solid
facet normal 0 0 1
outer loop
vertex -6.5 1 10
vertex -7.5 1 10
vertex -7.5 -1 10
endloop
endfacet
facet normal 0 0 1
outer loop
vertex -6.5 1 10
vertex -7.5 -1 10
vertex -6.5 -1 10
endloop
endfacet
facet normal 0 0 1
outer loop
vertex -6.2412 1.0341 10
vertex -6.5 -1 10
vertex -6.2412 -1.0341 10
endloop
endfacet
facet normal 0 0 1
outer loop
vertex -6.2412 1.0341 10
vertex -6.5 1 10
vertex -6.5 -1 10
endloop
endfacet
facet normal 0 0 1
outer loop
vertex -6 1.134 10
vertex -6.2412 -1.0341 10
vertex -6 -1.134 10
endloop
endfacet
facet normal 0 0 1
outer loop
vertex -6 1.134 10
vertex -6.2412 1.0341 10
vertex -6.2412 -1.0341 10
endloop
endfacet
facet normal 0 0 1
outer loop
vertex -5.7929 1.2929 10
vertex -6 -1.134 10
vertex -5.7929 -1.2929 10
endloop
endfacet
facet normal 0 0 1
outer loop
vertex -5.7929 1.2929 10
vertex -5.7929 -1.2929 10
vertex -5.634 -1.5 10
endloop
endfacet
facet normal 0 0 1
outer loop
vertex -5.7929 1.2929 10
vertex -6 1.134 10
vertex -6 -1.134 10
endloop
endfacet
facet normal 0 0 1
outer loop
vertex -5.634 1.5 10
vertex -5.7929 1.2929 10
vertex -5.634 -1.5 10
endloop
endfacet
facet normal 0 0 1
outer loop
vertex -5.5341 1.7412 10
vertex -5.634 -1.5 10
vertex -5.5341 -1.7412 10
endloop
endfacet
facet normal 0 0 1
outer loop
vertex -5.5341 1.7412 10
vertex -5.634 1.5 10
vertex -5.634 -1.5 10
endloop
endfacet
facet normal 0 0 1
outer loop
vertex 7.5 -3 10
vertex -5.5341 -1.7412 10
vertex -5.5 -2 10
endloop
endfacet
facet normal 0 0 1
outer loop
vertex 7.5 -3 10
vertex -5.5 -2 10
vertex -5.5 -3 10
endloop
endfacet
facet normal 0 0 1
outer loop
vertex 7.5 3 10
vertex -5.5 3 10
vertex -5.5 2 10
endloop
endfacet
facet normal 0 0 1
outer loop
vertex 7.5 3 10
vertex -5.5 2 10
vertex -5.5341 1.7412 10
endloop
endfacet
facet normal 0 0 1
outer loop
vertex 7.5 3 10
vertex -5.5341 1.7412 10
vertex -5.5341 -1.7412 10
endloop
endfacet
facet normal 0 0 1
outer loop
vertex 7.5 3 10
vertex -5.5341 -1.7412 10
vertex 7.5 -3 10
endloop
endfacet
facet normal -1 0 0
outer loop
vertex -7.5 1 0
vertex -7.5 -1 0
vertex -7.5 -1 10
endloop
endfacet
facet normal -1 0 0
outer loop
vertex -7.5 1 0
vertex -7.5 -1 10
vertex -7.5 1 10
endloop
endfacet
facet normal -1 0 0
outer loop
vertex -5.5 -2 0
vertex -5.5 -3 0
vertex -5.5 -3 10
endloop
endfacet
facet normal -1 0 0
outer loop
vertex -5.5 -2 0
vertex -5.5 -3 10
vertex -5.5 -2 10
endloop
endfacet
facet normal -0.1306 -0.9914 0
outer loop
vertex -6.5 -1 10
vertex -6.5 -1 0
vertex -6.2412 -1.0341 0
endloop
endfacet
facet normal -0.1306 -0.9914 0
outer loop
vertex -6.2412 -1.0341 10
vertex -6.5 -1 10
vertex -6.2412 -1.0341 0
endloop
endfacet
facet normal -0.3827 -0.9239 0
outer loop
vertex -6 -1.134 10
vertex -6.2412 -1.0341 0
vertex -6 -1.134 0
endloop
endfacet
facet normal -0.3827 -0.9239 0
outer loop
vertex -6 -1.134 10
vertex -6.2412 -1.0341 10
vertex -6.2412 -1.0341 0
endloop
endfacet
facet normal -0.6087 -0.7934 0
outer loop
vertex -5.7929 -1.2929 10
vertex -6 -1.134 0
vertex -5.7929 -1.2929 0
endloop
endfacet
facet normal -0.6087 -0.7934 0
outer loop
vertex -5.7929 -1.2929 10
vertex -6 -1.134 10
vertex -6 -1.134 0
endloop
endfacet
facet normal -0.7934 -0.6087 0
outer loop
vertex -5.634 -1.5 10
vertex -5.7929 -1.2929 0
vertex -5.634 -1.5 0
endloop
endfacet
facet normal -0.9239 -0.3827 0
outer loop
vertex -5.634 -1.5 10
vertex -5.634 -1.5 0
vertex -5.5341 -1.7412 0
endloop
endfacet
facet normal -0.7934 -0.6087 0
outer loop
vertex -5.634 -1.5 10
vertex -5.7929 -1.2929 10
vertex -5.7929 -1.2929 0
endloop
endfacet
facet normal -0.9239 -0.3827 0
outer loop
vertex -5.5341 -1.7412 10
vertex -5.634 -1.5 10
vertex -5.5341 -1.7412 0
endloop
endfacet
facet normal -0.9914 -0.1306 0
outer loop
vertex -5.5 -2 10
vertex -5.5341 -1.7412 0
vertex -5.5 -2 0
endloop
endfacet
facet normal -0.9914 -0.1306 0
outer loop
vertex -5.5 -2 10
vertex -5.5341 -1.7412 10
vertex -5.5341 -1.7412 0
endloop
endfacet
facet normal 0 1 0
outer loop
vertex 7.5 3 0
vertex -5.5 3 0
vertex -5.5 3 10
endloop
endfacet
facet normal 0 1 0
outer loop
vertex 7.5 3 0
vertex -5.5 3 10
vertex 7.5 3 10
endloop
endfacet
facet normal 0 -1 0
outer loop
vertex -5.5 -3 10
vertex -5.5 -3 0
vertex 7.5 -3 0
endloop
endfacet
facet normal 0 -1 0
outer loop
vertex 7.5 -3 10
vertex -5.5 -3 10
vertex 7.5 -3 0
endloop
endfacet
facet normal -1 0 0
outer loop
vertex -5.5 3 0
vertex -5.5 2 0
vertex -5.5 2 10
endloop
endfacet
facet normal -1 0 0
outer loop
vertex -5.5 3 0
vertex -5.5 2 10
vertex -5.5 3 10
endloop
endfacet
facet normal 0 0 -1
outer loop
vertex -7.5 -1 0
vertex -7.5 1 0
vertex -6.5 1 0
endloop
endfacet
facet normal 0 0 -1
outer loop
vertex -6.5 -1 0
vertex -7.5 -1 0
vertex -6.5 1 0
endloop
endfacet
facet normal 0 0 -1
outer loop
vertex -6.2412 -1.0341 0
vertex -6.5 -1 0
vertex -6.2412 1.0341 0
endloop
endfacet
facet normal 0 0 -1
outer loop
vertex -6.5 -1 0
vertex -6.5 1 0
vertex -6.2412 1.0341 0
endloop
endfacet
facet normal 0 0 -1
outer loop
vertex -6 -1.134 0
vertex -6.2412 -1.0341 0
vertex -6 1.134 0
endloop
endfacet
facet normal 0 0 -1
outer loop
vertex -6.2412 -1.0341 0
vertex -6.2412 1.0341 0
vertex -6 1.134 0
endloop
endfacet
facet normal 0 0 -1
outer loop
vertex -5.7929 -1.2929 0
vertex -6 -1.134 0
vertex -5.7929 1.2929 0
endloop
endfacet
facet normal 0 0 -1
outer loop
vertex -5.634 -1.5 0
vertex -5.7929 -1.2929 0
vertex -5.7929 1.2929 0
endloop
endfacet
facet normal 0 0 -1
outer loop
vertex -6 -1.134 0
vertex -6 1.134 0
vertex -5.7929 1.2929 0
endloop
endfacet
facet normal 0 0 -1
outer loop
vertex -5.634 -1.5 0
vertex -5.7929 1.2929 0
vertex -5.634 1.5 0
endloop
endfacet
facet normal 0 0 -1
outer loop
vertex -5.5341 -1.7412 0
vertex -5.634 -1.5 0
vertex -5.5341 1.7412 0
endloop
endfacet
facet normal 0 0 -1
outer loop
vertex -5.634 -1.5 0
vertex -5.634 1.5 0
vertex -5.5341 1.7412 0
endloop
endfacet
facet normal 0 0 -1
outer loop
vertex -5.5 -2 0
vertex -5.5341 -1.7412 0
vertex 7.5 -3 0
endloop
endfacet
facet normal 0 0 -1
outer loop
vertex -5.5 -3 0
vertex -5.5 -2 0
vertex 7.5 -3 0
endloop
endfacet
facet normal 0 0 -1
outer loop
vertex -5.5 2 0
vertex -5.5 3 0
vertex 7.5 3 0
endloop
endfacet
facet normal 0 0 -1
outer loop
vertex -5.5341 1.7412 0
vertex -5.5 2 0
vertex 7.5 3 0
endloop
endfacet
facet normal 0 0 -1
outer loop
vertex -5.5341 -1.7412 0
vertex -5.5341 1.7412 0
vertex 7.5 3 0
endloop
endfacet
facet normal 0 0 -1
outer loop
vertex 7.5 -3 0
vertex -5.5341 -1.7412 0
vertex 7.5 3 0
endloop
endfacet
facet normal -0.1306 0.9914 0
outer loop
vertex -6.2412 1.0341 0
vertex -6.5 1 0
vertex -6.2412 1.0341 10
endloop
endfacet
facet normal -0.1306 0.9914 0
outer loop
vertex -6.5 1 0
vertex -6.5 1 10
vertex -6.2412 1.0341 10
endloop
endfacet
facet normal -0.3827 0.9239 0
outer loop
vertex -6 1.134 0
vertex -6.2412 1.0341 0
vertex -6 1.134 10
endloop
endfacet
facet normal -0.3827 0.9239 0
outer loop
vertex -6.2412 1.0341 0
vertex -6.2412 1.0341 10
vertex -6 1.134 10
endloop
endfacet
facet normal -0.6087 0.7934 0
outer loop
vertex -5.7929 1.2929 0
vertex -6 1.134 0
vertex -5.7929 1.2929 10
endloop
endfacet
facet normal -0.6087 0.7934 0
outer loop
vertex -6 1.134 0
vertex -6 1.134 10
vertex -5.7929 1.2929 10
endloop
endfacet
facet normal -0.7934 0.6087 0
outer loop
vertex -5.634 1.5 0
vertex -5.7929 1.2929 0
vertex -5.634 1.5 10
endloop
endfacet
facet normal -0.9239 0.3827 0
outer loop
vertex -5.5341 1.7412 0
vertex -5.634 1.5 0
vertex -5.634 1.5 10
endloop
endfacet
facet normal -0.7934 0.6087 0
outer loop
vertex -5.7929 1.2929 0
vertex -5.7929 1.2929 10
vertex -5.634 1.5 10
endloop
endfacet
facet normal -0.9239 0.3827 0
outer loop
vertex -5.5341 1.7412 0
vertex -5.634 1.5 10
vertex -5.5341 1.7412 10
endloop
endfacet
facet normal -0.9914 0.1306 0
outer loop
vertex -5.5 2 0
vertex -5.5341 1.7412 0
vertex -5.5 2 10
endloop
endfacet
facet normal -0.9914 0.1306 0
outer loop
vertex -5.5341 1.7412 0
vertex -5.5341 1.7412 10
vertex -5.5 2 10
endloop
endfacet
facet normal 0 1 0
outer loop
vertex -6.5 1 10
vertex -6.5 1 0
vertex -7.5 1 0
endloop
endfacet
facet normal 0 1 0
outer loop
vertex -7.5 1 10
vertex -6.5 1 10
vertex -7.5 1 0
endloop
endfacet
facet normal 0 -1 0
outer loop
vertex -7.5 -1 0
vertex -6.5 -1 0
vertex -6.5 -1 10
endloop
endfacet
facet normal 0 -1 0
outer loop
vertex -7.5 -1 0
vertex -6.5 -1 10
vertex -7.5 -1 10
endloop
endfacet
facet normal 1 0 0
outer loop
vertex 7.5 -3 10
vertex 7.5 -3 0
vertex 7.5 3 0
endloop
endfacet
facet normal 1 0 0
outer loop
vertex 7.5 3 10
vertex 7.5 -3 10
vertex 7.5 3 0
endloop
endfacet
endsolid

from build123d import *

# Parameters (mm, degrees)
ESQUISSE1_W             = 15
ESQUISSE1_H             = 6
BOSS_EXTRU_1_DEPTH      = 10
ESQUISSE2_W             = 2
ESQUISSE2_H             = 2
ENL_V_MAT_EXTRU_1_DEPTH = 13.854960132
CONG_1_R                = 1


with BuildPart() as part:
    # Esquisse1 → Boss.-Extru.1 (new body)
    with BuildSketch(Plane.XY):
        Rectangle(ESQUISSE1_W, ESQUISSE1_H)
    extrude(amount=BOSS_EXTRU_1_DEPTH)

    # Esquisse2 → Enlèv. mat.-Extru.1 (cut, through all)
    with BuildSketch(Plane(origin=(0, 0, 0), x_dir=(-1, 0, 0), z_dir=(0, 0, -1))):
        with Locations((6.5, 2)):
            Rectangle(ESQUISSE2_W, ESQUISSE2_H)
        with Locations((6.5, -2)):
            Rectangle(ESQUISSE2_W, ESQUISSE2_H)
    extrude(amount=-ENL_V_MAT_EXTRU_1_DEPTH, mode=Mode.SUBTRACT)

    # Congé1
    cong_1_edges = [part.edges().sort_by_distance(p)[0] for p in [
        (-5.5, 1, 5),
        (-5.5, -1, 5),
    ]]
    fillet(cong_1_edges, radius=CONG_1_R)


solid = part.part
